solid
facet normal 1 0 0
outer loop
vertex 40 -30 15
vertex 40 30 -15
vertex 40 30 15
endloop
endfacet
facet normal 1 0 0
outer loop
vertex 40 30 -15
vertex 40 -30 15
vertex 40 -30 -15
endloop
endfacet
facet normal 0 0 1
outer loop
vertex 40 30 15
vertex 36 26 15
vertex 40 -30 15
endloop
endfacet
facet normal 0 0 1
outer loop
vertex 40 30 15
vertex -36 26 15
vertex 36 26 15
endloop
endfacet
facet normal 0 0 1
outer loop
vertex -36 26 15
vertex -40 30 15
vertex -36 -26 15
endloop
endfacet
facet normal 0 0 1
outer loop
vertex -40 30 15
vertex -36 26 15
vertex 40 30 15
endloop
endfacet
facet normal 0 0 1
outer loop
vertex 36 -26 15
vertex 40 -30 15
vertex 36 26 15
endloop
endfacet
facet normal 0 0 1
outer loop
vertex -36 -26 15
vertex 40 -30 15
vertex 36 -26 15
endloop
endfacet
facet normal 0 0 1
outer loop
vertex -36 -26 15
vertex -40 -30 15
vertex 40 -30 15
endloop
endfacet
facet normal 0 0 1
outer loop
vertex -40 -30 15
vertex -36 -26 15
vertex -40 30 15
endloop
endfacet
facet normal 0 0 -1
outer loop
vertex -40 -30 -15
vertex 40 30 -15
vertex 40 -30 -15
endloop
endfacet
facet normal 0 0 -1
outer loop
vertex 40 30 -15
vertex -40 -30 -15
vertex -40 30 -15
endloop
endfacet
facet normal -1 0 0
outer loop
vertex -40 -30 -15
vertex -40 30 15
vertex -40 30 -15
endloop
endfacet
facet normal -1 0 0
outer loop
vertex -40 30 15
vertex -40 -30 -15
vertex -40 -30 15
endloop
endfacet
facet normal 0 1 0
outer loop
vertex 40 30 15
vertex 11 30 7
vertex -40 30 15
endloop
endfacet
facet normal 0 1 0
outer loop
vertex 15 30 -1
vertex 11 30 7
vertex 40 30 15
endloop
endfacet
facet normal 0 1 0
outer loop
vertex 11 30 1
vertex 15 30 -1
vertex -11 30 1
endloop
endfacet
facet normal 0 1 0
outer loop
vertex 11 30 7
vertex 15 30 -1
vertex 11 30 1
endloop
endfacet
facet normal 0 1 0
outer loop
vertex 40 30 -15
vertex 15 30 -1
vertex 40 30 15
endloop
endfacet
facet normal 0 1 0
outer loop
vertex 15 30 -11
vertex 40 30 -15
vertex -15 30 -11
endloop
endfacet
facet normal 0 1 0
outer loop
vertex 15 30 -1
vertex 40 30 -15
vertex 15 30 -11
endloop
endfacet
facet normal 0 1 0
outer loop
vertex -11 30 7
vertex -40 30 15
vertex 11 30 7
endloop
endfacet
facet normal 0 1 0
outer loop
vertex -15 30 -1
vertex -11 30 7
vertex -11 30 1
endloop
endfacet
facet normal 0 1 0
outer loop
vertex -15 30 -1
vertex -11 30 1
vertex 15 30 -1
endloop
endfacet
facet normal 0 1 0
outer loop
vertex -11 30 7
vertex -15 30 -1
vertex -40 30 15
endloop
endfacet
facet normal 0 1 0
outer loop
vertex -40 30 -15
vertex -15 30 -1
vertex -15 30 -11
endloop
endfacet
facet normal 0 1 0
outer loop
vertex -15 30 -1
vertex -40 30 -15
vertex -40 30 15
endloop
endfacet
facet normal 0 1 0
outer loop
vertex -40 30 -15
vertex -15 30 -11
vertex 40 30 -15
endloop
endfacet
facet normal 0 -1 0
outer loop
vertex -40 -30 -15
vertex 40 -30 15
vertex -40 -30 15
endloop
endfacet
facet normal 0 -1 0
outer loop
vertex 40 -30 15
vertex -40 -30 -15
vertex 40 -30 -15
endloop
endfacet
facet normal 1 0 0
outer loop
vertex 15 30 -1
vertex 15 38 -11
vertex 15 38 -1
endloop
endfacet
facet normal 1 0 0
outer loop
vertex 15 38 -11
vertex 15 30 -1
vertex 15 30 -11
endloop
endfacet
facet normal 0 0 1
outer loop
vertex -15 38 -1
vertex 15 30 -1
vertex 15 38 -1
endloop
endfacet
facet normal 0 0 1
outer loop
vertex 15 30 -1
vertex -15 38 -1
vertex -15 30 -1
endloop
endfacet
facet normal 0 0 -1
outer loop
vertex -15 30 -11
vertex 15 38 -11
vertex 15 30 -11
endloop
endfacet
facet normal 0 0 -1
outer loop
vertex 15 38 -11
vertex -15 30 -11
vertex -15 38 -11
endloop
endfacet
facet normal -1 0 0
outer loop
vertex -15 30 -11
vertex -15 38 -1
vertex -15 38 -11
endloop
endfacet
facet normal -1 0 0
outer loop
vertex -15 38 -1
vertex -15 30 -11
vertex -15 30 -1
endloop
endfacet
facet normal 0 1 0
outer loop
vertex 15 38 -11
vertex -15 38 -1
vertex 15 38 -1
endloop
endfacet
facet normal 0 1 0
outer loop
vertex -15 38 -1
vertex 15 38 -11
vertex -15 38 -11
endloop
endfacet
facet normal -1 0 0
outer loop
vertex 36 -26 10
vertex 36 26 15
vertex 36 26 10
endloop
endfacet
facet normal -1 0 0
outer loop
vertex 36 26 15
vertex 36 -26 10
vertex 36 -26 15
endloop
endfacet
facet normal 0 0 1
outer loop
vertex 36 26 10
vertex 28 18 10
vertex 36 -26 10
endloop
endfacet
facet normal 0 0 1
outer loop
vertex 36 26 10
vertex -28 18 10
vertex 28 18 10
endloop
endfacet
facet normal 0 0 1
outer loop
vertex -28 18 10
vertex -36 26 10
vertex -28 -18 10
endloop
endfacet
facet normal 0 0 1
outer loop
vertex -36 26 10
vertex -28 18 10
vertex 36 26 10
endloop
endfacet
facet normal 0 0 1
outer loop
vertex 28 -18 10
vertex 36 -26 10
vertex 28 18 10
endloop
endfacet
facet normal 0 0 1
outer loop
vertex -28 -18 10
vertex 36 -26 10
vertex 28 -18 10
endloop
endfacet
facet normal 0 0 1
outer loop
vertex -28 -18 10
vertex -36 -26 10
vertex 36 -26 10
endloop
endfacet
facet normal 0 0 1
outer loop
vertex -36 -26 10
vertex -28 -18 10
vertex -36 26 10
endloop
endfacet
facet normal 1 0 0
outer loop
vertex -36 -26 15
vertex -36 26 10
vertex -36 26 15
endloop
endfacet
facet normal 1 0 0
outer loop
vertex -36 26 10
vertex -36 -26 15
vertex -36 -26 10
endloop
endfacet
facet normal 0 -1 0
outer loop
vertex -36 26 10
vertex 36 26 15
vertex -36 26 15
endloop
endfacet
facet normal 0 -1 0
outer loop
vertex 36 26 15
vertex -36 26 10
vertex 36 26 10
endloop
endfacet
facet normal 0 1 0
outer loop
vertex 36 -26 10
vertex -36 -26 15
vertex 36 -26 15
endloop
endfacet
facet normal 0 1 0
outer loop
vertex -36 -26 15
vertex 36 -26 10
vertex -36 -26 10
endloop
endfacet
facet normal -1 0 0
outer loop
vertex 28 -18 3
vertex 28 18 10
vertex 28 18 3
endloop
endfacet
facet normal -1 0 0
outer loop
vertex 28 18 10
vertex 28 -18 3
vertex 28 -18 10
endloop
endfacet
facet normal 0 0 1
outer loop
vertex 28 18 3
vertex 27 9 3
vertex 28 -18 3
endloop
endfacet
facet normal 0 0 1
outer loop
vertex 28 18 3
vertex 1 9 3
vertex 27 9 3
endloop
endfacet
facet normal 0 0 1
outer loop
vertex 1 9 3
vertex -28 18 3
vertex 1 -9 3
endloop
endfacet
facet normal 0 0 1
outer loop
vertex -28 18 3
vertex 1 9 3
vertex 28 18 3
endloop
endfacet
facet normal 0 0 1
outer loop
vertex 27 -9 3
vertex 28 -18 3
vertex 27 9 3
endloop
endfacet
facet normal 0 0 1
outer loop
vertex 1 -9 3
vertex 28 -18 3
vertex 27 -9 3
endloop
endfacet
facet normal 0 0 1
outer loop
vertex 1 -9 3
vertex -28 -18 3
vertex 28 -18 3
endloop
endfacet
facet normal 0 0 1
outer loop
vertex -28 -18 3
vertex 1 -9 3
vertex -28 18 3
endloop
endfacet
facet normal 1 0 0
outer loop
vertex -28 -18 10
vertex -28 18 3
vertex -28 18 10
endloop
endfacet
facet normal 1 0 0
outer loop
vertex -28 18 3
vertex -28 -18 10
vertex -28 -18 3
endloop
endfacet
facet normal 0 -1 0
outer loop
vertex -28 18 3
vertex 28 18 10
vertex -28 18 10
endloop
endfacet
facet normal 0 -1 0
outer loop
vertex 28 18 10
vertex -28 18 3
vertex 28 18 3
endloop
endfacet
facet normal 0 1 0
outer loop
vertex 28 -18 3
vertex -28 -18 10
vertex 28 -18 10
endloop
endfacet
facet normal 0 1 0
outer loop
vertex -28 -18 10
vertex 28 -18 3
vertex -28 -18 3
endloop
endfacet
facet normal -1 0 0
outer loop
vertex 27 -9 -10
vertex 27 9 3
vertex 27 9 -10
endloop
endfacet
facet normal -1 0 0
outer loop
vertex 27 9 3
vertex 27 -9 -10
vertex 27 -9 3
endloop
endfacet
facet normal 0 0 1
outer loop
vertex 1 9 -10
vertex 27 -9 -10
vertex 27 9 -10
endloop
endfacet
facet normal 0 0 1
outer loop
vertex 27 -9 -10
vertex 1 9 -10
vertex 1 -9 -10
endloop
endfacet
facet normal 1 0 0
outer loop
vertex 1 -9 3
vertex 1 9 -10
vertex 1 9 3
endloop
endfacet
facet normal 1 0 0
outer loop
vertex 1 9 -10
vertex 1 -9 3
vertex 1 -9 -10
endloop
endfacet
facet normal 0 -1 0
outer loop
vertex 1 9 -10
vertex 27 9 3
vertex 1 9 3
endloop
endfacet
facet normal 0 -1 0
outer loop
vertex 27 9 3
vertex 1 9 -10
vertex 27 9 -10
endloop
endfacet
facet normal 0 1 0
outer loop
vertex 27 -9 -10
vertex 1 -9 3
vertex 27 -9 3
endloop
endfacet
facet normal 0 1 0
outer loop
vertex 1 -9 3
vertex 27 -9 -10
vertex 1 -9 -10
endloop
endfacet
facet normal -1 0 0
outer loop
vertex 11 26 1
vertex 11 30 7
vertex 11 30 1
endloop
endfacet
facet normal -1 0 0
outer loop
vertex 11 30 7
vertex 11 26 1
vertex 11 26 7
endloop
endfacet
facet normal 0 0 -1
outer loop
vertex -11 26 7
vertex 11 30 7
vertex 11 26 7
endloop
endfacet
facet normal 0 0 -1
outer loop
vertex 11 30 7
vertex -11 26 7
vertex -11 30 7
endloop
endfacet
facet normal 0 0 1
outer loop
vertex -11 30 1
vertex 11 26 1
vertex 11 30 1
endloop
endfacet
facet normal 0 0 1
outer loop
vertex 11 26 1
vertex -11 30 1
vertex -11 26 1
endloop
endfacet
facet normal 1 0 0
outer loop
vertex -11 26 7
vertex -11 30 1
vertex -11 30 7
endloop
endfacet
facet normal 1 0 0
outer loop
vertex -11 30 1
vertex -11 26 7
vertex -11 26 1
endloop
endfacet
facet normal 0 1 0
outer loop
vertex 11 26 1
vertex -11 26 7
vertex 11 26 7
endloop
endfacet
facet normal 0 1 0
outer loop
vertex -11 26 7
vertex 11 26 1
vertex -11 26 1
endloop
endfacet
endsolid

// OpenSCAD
// ==============================================================
// Stepped-Cavity Block with Side Boss
// A rectangular body with a nested, top-open stepped pocket,
// an offset deep well, a side projection, and a side recess.
// ==============================================================

// ---------------- Parameters (mm) ----------------

// Main body
body_w = 80;                 // width  (X)
body_d = 60;                 // depth  (Y)
body_h = 30;                 // height (Z)

// Upper (broad) recess — leaves a thin rim around the opening
rim_w       = 4;             // thin rim width
step1_depth = 5;             // depth of broad recess below top face

// Second recess — smaller inset rectangle, deeper
step2_inset = 8;             // additional inset per side vs. upper recess
step2_depth = 12;            // depth below top face

// Deepest pocket — shifted toward +X for uneven ledges
pocket_w     = 26;           // pocket width  (X)
pocket_d     = 18;           // pocket depth  (Y)
pocket_depth = 25;           // depth below top (leaves a solid bottom)
pocket_dx    = 14;           // offset of pocket center toward +X

// Side projection (boss) on the +Y face
boss_w = 30;                 // boss width along X
boss_h = 10;                 // boss height along Z
boss_t = 8;                  // boss projection thickness along Y
boss_z = 4;                  // boss bottom height above base

// Side recess cut into the +Y face, above the boss
srec_w   = 22;               // recess width along X
srec_h   = 6;                // recess height along Z
srec_d   = 4;                // recess cut depth into the face
srec_gap = 2;                // vertical gap between boss top and recess

eps = 0.1;                   // overlap epsilon for clean boolean cuts
$fn = 60;                    // curve resolution (no curves here, set anyway)

// ---------------- Helper modules ----------------

// Rectangular cut opening at the top face, descending `depth`
module top_cut(w, d, depth, dx = 0, dy = 0) {
    translate([dx, dy, body_h/2 - depth/2 + eps/2])
        cube([w, d, depth + eps], center = true);
}

// Added rectangular projection on the +Y side face
module side_boss() {
    translate([-boss_w/2, body_d/2, -body_h/2 + boss_z])
        cube([boss_w, boss_t, boss_h]);
}

// Recess cut into the +Y side face, stepped above the boss
module side_recess_cut() {
    z0 = -body_h/2 + boss_z + boss_h + srec_gap;   // above boss + gap
    translate([-srec_w/2, body_d/2 - srec_d, z0])
        cube([srec_w, srec_d + eps, srec_h]);
}

// ---------------- Main model ----------------
difference() {
    // 1) Added material: main body plus the single side projection
    union() {
        cube([body_w, body_d, body_h], center = true);  // main solid
        side_boss();                                     // side boss
    }

    // 2) Broad upper recess — leaves only the thin rim at the top
    top_cut(body_w - 2*rim_w,
            body_d - 2*rim_w,
            step1_depth);

    // 3) Second, smaller inset recess — deeper tier
    top_cut(body_w - 2*(rim_w + step2_inset),
            body_d - 2*(rim_w + step2_inset),
            step2_depth);

    // 4) Deepest pocket, shifted toward +X (uneven interior ledges);
    //    pocket_depth < body_h guarantees a solid bottom
    top_cut(pocket_w, pocket_d, pocket_depth, dx = pocket_dx);

    // 5) Side recess above the boss — extra stepped depth tier
    side_recess_cut();
}
